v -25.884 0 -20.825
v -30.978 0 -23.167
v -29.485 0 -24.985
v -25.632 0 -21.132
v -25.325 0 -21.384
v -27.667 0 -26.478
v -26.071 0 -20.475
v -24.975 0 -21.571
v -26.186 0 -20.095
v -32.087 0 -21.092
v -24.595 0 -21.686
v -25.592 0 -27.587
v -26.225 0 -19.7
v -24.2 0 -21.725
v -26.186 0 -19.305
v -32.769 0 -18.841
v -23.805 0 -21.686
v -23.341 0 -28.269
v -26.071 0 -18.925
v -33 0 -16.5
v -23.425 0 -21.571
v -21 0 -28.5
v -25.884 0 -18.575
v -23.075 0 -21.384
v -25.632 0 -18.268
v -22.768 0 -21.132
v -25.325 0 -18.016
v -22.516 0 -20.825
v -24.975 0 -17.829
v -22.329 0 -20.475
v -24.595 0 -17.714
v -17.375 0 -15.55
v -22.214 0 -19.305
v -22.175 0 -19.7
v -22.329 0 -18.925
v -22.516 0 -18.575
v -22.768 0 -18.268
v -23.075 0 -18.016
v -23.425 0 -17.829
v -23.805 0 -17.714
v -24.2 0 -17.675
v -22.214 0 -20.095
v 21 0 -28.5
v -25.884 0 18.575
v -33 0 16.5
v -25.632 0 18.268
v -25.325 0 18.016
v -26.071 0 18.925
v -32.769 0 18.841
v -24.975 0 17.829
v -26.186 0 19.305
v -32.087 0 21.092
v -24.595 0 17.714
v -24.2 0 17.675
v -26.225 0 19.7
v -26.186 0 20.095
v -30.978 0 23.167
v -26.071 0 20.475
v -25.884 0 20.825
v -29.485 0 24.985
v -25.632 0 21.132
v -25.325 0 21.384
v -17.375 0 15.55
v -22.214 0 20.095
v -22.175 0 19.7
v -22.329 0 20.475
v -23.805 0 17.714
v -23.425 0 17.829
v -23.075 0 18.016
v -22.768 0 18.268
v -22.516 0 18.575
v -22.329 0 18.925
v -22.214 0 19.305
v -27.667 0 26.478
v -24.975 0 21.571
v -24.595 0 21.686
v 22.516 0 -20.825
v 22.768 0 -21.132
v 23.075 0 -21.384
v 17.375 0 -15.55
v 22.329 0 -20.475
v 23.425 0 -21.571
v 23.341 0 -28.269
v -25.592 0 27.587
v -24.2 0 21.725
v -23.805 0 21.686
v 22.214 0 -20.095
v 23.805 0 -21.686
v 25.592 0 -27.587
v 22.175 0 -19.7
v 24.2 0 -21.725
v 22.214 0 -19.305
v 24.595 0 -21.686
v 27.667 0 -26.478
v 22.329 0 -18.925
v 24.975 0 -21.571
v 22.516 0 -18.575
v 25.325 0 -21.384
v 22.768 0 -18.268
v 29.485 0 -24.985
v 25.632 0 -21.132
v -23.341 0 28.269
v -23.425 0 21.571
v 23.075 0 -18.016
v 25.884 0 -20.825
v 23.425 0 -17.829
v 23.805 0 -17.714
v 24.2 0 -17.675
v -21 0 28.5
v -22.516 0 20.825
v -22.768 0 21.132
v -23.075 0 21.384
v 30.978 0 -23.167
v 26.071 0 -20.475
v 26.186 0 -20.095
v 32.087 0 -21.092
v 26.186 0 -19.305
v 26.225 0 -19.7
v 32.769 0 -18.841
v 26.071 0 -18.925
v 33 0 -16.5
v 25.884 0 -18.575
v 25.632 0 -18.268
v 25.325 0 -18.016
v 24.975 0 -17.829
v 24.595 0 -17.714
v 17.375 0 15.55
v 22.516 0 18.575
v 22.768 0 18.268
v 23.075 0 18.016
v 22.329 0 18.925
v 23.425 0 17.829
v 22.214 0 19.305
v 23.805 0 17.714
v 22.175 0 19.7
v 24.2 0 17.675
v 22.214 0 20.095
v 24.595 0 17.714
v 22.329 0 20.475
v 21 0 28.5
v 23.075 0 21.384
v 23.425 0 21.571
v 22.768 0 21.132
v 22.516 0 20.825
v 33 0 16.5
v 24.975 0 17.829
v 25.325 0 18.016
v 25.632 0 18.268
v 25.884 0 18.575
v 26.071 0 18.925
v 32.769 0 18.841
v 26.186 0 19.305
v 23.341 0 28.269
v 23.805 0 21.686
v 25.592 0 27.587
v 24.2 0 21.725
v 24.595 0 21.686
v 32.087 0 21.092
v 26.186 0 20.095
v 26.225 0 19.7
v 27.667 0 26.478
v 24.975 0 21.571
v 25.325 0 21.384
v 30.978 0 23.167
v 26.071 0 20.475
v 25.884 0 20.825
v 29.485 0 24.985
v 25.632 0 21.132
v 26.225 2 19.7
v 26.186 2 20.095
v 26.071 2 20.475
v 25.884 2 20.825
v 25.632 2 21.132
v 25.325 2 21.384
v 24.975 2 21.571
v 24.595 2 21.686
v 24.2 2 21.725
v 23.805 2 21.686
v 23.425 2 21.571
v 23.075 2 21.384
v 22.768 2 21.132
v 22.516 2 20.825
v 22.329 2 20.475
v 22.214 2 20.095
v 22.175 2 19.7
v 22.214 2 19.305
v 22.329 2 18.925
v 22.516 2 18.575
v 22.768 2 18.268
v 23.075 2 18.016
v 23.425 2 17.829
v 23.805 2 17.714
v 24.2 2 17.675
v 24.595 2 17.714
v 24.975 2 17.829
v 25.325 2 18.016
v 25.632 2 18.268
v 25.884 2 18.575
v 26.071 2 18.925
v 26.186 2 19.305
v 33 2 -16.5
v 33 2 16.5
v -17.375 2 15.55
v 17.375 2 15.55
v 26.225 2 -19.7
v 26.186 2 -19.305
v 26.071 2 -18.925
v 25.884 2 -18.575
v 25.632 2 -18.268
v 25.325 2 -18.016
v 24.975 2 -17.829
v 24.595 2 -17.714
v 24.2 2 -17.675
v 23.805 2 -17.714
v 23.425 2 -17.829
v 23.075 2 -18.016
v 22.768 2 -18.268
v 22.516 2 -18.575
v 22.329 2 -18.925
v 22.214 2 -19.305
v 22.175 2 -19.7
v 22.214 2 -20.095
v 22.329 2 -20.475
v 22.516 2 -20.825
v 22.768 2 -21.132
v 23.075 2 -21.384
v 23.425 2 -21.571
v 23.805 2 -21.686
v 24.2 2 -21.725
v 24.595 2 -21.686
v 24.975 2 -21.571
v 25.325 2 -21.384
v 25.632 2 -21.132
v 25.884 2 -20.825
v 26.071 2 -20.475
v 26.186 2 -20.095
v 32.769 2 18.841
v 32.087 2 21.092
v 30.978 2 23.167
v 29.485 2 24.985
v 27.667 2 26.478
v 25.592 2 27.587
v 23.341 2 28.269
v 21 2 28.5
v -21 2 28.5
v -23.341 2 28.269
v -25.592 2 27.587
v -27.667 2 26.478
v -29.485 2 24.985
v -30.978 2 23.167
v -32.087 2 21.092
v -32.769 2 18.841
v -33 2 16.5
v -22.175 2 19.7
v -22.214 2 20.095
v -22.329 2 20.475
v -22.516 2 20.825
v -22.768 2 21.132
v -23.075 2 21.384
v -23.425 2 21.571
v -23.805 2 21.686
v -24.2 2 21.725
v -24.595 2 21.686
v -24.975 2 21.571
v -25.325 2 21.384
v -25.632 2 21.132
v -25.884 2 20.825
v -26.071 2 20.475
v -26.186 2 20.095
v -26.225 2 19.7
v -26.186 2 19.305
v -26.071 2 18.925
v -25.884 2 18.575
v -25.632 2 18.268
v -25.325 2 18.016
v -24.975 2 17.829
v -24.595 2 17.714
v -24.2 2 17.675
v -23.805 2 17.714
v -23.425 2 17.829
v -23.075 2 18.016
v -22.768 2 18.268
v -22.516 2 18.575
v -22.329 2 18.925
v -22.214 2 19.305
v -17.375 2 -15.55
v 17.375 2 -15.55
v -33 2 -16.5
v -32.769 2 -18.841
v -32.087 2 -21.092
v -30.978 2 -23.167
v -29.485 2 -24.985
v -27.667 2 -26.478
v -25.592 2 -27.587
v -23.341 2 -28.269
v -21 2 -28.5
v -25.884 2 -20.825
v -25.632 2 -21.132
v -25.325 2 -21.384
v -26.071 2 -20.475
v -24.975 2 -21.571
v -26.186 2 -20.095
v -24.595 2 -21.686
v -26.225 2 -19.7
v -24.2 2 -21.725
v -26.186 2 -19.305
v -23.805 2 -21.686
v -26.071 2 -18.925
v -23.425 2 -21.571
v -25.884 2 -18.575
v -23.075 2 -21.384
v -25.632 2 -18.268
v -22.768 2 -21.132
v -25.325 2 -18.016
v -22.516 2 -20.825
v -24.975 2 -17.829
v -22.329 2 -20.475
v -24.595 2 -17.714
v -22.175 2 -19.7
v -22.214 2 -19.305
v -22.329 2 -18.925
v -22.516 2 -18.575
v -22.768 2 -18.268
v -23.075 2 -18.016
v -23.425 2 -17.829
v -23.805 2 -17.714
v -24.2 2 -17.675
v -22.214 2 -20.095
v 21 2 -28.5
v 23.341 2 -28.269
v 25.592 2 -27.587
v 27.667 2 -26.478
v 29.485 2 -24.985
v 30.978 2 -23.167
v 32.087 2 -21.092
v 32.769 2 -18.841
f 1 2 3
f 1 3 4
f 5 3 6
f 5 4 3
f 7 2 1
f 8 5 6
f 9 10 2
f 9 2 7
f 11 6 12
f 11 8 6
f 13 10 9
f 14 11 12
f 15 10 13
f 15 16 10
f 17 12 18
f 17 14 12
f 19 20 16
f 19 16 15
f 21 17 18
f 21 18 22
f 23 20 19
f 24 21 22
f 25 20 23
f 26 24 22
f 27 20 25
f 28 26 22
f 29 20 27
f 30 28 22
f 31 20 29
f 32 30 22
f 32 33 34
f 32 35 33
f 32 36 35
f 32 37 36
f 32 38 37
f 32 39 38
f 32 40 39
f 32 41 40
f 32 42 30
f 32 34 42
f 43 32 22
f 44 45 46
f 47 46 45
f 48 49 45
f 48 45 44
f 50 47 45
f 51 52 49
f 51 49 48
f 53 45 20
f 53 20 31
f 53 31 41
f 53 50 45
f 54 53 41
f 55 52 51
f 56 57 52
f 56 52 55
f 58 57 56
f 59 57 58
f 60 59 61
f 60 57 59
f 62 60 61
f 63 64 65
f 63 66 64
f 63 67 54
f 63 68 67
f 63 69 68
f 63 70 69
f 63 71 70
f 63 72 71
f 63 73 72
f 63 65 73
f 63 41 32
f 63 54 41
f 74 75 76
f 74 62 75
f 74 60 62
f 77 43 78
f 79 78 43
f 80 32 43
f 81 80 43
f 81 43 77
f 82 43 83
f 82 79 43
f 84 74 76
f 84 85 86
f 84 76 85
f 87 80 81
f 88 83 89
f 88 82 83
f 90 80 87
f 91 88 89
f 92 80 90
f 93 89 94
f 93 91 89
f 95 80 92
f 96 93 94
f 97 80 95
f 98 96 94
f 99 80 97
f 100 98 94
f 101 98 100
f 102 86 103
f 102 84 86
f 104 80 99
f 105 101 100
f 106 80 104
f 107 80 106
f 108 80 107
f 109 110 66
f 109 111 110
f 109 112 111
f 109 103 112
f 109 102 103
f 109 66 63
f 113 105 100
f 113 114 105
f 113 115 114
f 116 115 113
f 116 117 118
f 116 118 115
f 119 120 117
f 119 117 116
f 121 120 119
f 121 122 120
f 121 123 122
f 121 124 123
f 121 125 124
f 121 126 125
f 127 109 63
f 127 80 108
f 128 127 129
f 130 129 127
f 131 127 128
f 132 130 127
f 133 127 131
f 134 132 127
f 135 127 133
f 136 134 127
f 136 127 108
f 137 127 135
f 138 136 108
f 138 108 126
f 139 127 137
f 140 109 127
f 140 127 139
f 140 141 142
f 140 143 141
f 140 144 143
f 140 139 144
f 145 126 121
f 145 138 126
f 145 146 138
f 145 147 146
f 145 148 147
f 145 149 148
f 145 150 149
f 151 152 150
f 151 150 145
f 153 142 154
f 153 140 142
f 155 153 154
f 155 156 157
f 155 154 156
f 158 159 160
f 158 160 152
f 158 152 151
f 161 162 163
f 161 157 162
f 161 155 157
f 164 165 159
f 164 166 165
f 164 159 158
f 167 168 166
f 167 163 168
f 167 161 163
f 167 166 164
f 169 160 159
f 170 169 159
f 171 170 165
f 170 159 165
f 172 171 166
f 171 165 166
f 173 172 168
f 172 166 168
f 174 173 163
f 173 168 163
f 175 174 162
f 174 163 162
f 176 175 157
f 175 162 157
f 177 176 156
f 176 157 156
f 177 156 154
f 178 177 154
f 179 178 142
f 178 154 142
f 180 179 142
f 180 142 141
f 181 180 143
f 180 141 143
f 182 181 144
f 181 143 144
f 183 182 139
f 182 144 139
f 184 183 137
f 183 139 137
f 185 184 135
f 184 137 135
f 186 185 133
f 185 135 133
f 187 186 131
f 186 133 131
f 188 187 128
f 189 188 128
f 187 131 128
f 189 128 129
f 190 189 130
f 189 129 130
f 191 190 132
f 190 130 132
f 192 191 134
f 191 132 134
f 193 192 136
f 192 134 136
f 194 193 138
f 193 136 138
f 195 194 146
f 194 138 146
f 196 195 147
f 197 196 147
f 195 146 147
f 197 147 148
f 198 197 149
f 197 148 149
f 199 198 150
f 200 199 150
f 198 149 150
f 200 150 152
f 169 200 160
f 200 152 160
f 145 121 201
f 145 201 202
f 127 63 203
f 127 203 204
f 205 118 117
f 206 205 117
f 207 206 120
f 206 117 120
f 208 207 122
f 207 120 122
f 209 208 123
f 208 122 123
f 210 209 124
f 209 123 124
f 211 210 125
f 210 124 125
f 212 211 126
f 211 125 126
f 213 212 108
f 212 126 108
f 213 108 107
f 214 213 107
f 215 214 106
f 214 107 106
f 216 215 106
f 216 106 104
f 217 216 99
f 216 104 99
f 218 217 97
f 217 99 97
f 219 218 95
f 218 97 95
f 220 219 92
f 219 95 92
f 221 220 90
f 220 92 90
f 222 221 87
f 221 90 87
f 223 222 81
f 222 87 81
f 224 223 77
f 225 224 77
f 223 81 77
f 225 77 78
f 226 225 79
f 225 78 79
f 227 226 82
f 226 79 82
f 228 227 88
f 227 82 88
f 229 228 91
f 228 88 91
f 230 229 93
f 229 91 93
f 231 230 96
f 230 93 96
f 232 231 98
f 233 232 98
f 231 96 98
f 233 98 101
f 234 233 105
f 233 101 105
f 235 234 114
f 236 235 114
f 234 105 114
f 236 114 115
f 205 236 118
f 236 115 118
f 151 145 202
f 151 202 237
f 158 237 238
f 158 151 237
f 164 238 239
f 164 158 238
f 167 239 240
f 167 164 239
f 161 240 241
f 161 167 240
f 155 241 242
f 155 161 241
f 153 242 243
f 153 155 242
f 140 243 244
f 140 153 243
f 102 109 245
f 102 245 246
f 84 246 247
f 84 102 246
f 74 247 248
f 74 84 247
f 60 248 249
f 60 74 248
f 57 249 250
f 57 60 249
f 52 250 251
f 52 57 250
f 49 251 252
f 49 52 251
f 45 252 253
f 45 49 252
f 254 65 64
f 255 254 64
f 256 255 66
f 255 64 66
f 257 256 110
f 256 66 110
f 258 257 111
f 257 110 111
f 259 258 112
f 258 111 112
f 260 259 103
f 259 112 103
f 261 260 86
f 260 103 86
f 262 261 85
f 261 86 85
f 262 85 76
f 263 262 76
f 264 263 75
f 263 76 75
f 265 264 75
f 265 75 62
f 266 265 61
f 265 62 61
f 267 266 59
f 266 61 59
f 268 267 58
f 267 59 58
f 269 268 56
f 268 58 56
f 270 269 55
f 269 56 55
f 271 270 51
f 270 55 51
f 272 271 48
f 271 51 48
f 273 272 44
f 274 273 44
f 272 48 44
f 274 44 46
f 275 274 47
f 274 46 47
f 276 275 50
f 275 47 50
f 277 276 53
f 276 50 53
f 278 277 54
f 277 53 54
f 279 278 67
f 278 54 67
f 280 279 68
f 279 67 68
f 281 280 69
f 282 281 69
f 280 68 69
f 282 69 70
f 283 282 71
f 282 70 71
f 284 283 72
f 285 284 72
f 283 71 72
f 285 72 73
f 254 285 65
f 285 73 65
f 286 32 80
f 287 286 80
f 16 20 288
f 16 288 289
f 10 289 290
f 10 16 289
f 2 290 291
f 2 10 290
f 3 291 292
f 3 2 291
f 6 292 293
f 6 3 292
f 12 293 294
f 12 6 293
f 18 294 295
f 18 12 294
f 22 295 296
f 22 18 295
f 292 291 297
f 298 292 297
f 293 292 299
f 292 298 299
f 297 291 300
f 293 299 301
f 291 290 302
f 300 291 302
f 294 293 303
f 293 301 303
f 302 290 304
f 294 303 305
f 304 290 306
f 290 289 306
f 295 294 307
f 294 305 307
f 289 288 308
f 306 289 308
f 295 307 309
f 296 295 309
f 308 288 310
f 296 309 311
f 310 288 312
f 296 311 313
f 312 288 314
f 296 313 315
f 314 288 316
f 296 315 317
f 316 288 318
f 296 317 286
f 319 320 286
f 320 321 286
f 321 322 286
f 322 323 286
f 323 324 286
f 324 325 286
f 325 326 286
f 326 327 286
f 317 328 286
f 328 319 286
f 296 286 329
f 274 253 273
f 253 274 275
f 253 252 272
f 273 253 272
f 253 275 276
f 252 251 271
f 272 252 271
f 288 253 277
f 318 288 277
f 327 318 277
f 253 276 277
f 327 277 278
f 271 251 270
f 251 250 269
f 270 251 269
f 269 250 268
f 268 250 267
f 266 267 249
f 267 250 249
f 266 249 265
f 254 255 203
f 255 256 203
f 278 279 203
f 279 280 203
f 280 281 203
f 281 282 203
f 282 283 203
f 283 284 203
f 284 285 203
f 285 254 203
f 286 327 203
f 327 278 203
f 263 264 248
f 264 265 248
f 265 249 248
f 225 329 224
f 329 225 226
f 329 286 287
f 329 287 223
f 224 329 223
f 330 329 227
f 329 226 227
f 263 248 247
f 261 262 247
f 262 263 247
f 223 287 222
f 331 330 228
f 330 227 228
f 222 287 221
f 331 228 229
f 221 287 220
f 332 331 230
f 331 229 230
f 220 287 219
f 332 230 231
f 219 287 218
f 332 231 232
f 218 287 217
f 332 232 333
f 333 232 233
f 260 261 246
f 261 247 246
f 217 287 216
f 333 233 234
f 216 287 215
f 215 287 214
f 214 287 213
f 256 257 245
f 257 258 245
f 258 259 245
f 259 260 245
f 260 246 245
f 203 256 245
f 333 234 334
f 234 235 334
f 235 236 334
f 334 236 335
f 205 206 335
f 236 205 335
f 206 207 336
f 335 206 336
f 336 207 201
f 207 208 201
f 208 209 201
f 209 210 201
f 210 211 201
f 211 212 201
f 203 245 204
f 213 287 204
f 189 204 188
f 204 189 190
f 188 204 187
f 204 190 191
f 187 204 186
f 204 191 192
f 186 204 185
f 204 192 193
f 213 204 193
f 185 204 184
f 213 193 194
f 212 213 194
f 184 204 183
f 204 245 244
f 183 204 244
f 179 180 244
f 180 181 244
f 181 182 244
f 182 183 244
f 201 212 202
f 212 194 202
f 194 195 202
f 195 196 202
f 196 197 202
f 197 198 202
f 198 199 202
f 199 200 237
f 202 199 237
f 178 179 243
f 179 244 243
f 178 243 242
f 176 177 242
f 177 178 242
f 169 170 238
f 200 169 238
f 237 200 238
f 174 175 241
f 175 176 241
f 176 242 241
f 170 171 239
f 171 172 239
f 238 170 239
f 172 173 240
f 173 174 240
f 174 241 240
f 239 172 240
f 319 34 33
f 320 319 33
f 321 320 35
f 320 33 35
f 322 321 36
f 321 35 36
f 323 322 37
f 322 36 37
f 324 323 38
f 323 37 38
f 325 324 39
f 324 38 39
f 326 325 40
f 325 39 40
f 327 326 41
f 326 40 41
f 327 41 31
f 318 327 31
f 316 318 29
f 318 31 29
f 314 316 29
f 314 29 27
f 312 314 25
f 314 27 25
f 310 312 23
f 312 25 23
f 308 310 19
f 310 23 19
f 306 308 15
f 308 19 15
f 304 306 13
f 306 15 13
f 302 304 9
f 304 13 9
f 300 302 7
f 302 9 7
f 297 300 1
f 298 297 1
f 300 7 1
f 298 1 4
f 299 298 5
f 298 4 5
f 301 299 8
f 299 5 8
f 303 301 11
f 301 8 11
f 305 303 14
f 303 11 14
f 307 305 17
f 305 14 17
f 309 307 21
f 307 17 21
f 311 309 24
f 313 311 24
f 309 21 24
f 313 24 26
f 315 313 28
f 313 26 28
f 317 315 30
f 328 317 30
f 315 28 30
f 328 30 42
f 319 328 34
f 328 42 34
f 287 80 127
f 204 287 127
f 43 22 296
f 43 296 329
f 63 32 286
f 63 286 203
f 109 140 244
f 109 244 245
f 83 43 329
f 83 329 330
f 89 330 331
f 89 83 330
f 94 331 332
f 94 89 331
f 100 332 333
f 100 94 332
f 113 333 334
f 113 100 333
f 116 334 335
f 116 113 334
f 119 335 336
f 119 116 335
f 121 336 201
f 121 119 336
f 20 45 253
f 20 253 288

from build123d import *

# Parameters (mm, degrees)
F0_R     = 2.025
F0_W     = 34.75
F0_H     = 31.1
F1_DEPTH = 2


with BuildPart() as f1:
    # F0 (on Front) → F1 (new body)
    with BuildSketch(Plane.XZ):
        with BuildLine():
            Line((-21, -28.5), (21, -28.5))
            ThreePointArc((21, -28.5), (29.485281, -24.985281), (33, -16.5))
            Line((33, -16.5), (33, 16.5))
            ThreePointArc((33, 16.5), (29.485281, 24.985281), (21, 28.5))
            Line((21, 28.5), (-21, 28.5))
            ThreePointArc((-21, 28.5), (-29.485281, 24.985281), (-33, 16.5))
            Line((-33, 16.5), (-33, -16.5))
            ThreePointArc((-33, -16.5), (-29.485281, -24.985281), (-21, -28.5))
        make_face()
        with Locations((-24.2, -19.7)):
            Circle(F0_R, mode=Mode.SUBTRACT)
        with Locations((24.2, -19.7)):
            Circle(F0_R, mode=Mode.SUBTRACT)
        with Locations((-24.2, 19.7)):
            Circle(F0_R, mode=Mode.SUBTRACT)
        Rectangle(F0_W, F0_H, mode=Mode.SUBTRACT)
        with Locations((24.2, 19.7)):
            Circle(F0_R, mode=Mode.SUBTRACT)
    extrude(amount=-F1_DEPTH)


solid = f1.part
